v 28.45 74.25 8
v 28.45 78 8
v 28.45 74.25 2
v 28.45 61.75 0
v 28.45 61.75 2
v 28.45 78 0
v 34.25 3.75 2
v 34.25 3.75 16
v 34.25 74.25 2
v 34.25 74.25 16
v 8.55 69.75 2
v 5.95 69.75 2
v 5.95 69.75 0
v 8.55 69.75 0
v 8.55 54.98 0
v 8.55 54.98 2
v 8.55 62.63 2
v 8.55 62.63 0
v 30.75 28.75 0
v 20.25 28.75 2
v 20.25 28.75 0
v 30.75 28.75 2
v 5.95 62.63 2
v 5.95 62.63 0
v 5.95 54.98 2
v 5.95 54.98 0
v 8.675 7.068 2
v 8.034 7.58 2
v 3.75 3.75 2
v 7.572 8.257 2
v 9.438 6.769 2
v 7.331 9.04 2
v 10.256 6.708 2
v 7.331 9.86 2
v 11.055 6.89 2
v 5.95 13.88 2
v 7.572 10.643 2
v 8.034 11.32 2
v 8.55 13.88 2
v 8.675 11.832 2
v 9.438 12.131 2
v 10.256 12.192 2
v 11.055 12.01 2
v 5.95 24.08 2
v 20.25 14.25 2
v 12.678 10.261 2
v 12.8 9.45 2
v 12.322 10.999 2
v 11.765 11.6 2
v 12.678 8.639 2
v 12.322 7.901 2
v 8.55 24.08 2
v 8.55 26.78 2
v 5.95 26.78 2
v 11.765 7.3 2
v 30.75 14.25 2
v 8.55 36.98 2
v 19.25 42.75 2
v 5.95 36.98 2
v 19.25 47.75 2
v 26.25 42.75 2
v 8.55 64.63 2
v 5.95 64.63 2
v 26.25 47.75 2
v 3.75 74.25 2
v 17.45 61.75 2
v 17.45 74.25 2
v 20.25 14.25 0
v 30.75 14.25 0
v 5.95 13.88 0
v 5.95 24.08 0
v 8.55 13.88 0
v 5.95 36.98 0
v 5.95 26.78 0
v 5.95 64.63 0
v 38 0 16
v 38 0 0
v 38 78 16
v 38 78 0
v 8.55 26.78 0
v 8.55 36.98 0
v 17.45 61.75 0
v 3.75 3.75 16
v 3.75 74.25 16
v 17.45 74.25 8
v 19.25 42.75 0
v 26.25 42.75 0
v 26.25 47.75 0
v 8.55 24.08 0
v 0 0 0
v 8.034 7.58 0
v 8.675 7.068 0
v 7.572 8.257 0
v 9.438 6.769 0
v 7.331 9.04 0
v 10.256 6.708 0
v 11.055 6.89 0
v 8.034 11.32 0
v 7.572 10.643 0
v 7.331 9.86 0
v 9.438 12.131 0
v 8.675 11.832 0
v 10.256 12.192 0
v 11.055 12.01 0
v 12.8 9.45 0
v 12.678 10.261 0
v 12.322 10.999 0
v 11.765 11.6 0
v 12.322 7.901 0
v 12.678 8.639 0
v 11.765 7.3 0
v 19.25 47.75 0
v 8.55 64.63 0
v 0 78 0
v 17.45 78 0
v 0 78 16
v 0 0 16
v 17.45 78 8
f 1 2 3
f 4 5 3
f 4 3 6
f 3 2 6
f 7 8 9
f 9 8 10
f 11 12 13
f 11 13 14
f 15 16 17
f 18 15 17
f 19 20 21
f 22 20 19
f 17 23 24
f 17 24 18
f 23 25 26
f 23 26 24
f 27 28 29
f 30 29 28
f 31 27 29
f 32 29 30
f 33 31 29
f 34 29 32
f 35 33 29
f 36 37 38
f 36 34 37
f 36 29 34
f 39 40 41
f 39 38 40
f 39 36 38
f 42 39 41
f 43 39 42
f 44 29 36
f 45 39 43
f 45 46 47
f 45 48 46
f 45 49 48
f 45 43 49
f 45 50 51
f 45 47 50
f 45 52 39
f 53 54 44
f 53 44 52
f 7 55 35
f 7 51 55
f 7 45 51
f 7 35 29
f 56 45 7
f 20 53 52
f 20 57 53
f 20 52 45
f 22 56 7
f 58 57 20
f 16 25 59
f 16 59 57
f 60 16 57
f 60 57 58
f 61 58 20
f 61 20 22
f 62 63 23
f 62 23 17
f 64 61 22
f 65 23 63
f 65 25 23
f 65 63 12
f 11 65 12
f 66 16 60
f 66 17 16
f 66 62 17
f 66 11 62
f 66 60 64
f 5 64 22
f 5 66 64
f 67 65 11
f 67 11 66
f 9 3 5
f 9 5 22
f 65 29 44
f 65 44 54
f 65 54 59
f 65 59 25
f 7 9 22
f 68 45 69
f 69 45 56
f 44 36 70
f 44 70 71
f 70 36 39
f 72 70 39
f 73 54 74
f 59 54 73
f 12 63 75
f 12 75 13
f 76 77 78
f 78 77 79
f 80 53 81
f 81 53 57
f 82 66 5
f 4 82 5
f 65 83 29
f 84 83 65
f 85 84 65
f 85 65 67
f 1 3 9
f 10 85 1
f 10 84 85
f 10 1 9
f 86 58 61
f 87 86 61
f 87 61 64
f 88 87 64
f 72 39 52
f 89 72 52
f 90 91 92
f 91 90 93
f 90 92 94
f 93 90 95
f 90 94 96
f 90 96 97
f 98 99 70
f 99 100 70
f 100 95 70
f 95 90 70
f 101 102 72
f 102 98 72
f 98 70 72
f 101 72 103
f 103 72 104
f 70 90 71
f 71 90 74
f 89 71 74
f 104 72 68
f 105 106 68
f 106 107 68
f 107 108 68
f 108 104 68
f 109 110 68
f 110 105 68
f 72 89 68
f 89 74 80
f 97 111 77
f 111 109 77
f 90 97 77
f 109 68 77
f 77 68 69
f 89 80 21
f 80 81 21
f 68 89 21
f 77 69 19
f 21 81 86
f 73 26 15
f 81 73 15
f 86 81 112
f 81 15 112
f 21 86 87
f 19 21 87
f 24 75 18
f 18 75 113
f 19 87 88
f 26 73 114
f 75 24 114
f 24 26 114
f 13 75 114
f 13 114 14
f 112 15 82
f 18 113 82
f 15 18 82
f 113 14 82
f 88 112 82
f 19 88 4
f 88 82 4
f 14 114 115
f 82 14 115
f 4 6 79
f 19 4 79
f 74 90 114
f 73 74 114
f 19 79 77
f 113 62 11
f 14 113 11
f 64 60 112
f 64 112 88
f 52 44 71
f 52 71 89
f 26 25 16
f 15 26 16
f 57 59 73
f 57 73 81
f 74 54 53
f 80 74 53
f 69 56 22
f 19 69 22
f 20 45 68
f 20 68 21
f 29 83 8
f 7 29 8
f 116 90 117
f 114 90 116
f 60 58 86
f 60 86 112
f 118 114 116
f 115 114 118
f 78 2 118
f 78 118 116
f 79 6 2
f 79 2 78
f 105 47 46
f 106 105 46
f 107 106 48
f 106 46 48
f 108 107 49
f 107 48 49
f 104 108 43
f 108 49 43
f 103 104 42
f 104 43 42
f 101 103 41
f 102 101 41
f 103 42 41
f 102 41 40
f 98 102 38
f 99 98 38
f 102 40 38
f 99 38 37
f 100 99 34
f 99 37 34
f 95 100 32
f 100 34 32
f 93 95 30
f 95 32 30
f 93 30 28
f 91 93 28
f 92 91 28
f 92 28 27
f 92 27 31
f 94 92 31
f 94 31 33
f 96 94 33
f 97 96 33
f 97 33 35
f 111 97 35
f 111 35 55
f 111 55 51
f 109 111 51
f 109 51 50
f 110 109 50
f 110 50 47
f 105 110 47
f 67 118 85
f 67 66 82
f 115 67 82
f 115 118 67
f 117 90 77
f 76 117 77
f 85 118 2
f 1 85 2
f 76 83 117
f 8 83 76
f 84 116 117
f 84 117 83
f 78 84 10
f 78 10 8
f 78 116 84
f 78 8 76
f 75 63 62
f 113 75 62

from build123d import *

# Parameters (mm, degrees)
SKETCH1_W           = 38
SKETCH1_H           = 78
BOSS_EXTRUDE1_DEPTH = 16
SKETCH2_W           = 30.5
SKETCH2_H           = 70.5
CUT_EXTRUDE1_DEPTH  = 14
SKETCH3_R           = 2.75
SKETCH3_W           = 2.6
SKETCH3_H           = 5.12
SKETCH3_H_2         = 7.65
SKETCH3_H_3         = 10.2
SKETCH3_W_2         = 11
SKETCH3_H_4         = 12.5
SKETCH3_W_3         = 10.5
SKETCH3_H_5         = 14.5
SKETCH3_W_4         = 7
SKETCH3_H_6         = 5
CUT_EXTRUDE2_DEPTH  = 88.886290171
SKETCH4_W           = 11
SKETCH4_H           = 8
CUT_EXTRUDE3_DEPTH  = 3.75


with BuildPart() as part:
    # Sketch1 → Boss-Extrude1 (new body)
    with BuildSketch(Plane.XY):
        with Locations((19, 39)):
            Rectangle(SKETCH1_W, SKETCH1_H)
    extrude(amount=BOSS_EXTRUDE1_DEPTH)

    # Sketch2 → Cut-Extrude1 (cut)
    with BuildSketch(Plane.XY.offset(16)):
        with Locations((19, 39)):
            Rectangle(SKETCH2_W, SKETCH2_H)
    extrude(amount=-CUT_EXTRUDE1_DEPTH, mode=Mode.SUBTRACT)

    # Sketch3 → Cut-Extrude2 (cut, through all)
    with BuildSketch(Plane.XY.offset(2)):
        with Locations((10.05, 9.45)):
            Circle(SKETCH3_R)
        with Locations((7.25, 67.19)):
            Rectangle(SKETCH3_W, SKETCH3_H)
        with Locations((7.25, 58.805)):
            Rectangle(SKETCH3_W, SKETCH3_H_2)
        with Locations((7.25, 31.88)):
            Rectangle(SKETCH3_W, SKETCH3_H_3)
        with Locations((7.25, 18.98)):
            Rectangle(SKETCH3_W, SKETCH3_H_3)
        with Locations((22.95, 68)):
            Rectangle(SKETCH3_W_2, SKETCH3_H_4)
        with Locations((25.5, 21.5)):
            Rectangle(SKETCH3_W_3, SKETCH3_H_5)
        with Locations((22.75, 45.25)):
            Rectangle(SKETCH3_W_4, SKETCH3_H_6)
    extrude(amount=-CUT_EXTRUDE2_DEPTH, mode=Mode.SUBTRACT)

    # Sketch4 → Cut-Extrude3 (cut)
    with BuildSketch(Plane(origin=(0, 78, 0), x_dir=(1, 0, 0), z_dir=(0, 1, 0))):
        with Locations((22.95, -4)):
            Rectangle(SKETCH4_W, SKETCH4_H)
    extrude(amount=-CUT_EXTRUDE3_DEPTH, mode=Mode.SUBTRACT)


solid = part.part
